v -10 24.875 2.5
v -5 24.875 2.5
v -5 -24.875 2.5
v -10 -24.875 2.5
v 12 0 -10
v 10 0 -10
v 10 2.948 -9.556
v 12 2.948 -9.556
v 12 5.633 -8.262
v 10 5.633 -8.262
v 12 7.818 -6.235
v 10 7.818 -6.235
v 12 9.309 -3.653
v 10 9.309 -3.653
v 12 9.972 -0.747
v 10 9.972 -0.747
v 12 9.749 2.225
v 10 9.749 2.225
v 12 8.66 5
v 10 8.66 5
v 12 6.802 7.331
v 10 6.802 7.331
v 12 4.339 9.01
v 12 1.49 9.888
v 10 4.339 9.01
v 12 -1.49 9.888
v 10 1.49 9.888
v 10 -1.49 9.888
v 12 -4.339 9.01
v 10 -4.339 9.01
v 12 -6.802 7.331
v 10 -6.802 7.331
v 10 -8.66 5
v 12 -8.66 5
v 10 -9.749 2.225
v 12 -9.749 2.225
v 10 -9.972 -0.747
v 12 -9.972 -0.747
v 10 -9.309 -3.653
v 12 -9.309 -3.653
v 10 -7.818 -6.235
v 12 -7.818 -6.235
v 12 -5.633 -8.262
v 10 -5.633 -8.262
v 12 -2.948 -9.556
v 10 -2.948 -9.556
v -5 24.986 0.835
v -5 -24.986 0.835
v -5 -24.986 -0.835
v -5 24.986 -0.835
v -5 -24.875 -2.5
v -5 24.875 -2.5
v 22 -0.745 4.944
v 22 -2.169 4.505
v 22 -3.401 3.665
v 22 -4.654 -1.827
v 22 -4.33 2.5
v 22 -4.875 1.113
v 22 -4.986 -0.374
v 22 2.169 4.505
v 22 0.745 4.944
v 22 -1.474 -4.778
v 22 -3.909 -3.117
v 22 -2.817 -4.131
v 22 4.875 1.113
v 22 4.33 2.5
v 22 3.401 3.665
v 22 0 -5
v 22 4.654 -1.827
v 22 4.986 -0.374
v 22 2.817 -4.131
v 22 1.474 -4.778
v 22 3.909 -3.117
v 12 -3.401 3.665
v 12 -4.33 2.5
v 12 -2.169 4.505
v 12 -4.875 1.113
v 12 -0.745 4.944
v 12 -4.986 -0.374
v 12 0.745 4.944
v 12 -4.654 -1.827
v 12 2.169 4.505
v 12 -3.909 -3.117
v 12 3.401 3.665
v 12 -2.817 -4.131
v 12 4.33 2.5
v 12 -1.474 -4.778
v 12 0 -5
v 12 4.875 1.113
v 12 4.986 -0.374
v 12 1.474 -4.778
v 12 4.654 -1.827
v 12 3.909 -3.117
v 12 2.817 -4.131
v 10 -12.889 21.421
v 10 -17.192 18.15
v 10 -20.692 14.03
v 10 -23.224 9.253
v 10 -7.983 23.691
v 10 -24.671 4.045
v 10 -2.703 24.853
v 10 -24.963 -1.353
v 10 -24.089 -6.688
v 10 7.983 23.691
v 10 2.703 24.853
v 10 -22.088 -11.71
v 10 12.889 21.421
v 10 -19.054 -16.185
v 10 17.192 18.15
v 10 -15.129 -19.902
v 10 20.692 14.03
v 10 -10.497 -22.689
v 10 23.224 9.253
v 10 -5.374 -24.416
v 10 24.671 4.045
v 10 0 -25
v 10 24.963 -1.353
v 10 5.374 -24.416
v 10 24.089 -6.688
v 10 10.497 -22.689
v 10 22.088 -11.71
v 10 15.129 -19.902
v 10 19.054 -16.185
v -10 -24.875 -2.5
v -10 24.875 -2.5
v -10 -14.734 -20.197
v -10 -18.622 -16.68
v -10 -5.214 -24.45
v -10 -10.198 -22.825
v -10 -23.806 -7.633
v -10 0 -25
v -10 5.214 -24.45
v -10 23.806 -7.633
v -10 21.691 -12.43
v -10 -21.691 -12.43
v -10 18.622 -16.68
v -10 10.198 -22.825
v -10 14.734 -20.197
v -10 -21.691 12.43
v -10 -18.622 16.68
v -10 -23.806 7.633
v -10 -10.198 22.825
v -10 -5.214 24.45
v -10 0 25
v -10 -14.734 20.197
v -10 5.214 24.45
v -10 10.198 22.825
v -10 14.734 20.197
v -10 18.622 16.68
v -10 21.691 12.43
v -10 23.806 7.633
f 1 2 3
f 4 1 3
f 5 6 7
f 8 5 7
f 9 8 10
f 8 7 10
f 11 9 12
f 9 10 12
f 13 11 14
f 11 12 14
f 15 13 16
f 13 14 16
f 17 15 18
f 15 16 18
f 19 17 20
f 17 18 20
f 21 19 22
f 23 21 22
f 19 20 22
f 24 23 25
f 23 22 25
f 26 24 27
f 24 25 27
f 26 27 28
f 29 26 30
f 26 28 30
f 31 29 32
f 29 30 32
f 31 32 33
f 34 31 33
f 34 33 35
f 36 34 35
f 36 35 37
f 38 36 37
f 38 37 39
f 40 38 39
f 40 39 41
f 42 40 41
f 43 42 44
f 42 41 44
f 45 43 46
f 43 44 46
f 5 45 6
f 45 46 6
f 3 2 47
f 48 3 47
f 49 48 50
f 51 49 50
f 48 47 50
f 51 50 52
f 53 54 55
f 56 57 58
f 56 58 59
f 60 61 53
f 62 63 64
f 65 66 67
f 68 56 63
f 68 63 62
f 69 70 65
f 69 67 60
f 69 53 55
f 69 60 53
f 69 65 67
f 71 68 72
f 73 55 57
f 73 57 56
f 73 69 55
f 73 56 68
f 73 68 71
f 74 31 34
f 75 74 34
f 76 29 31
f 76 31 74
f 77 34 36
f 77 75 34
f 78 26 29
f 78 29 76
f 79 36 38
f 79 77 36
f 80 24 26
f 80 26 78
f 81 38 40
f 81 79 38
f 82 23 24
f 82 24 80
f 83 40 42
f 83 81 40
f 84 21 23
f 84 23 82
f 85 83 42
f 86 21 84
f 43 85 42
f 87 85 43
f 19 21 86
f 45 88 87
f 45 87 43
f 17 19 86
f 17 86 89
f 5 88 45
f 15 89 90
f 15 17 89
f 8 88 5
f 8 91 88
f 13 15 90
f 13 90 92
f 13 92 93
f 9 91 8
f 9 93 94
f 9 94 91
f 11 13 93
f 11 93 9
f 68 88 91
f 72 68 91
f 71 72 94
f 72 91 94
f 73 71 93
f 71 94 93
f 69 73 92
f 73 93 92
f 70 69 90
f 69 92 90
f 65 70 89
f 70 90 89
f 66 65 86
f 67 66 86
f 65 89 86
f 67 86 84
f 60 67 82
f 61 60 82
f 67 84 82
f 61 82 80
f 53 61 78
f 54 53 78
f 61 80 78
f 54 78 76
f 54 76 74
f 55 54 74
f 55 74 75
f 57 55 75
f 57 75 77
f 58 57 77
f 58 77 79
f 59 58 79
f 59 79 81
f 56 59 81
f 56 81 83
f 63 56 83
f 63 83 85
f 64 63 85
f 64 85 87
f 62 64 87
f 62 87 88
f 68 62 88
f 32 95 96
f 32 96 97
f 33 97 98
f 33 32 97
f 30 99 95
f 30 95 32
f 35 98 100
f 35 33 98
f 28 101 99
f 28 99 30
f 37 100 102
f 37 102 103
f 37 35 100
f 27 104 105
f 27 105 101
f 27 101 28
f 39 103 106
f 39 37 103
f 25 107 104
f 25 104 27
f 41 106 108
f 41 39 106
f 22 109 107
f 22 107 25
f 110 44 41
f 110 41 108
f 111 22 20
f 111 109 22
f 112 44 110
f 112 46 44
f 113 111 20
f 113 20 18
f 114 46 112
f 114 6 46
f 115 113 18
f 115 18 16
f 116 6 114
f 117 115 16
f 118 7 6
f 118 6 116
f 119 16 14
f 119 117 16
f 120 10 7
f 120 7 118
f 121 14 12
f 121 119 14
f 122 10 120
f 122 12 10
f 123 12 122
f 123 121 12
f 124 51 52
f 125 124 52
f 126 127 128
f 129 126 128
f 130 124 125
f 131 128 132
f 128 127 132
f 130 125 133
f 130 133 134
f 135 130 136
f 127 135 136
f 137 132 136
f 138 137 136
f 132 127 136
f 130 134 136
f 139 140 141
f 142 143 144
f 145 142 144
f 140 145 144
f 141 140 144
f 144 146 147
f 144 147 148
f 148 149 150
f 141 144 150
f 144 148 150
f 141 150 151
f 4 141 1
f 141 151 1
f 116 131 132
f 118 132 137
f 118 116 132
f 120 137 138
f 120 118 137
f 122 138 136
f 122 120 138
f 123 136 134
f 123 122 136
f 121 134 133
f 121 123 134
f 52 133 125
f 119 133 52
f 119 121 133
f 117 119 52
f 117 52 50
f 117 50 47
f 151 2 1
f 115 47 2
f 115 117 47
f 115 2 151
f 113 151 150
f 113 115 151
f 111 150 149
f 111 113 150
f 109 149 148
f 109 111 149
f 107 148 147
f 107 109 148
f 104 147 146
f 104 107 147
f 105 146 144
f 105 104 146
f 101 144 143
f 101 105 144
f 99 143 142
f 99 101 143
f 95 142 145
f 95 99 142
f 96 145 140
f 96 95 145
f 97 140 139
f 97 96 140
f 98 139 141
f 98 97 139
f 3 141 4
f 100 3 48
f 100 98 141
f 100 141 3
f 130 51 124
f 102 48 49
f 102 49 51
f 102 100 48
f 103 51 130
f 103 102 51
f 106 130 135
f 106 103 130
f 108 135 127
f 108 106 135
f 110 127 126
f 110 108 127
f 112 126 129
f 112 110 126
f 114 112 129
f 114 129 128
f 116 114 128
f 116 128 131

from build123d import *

# Parameters (mm, degrees)
SKETCH1_R           = 25
BOSS_EXTRUDE1_DEPTH = 10
SKETCH2_R           = 5
BOSS_EXTRUDE2_DEPTH = 12
CUT_EXTRUDE1_START  = -5
CUT_EXTRUDE1_DEPTH  = 5
SKETCH4_R           = 10
BOSS_EXTRUDE3_DEPTH = 2


with BuildPart() as part:
    # Sketch1 → Boss-Extrude1 (new, symmetric)
    with BuildSketch(Plane(origin=(0, 0, 0), x_dir=(0, 0, -1), z_dir=(1, 0, 0))):
        Circle(SKETCH1_R)
    extrude(amount=BOSS_EXTRUDE1_DEPTH, both=True)

    # Sketch2 → Boss-Extrude2 (add)
    with BuildSketch(Plane(origin=(10, 0, 0), x_dir=(0, 0, -1), z_dir=(1, 0, 0))):
        Circle(SKETCH2_R)
    extrude(amount=BOSS_EXTRUDE2_DEPTH)

    # Sketch3 → Cut-Extrude1 (cut)
    with BuildSketch(Plane.ZY.offset(10).offset(CUT_EXTRUDE1_START)):
        with BuildLine():
            Line((2.5, 24.874685928), (2.5, -24.874685928))
            ThreePointArc((2.5, -24.874685928), (0, -25), (-2.5, -24.874685928))
            Line((-2.5, -24.874685928), (-2.5, 24.874685928))
            ThreePointArc((-2.5, 24.874685928), (0, 25), (2.5, 24.874685928))
        make_face()
    extrude(amount=CUT_EXTRUDE1_DEPTH, mode=Mode.SUBTRACT)

    # Sketch4 → Boss-Extrude3 (add)
    with BuildSketch(Plane(origin=(10, 0, 0), x_dir=(0, 0, -1), z_dir=(1, 0, 0))):
        Circle(SKETCH4_R)
    extrude(amount=BOSS_EXTRUDE3_DEPTH)


solid = part.part
